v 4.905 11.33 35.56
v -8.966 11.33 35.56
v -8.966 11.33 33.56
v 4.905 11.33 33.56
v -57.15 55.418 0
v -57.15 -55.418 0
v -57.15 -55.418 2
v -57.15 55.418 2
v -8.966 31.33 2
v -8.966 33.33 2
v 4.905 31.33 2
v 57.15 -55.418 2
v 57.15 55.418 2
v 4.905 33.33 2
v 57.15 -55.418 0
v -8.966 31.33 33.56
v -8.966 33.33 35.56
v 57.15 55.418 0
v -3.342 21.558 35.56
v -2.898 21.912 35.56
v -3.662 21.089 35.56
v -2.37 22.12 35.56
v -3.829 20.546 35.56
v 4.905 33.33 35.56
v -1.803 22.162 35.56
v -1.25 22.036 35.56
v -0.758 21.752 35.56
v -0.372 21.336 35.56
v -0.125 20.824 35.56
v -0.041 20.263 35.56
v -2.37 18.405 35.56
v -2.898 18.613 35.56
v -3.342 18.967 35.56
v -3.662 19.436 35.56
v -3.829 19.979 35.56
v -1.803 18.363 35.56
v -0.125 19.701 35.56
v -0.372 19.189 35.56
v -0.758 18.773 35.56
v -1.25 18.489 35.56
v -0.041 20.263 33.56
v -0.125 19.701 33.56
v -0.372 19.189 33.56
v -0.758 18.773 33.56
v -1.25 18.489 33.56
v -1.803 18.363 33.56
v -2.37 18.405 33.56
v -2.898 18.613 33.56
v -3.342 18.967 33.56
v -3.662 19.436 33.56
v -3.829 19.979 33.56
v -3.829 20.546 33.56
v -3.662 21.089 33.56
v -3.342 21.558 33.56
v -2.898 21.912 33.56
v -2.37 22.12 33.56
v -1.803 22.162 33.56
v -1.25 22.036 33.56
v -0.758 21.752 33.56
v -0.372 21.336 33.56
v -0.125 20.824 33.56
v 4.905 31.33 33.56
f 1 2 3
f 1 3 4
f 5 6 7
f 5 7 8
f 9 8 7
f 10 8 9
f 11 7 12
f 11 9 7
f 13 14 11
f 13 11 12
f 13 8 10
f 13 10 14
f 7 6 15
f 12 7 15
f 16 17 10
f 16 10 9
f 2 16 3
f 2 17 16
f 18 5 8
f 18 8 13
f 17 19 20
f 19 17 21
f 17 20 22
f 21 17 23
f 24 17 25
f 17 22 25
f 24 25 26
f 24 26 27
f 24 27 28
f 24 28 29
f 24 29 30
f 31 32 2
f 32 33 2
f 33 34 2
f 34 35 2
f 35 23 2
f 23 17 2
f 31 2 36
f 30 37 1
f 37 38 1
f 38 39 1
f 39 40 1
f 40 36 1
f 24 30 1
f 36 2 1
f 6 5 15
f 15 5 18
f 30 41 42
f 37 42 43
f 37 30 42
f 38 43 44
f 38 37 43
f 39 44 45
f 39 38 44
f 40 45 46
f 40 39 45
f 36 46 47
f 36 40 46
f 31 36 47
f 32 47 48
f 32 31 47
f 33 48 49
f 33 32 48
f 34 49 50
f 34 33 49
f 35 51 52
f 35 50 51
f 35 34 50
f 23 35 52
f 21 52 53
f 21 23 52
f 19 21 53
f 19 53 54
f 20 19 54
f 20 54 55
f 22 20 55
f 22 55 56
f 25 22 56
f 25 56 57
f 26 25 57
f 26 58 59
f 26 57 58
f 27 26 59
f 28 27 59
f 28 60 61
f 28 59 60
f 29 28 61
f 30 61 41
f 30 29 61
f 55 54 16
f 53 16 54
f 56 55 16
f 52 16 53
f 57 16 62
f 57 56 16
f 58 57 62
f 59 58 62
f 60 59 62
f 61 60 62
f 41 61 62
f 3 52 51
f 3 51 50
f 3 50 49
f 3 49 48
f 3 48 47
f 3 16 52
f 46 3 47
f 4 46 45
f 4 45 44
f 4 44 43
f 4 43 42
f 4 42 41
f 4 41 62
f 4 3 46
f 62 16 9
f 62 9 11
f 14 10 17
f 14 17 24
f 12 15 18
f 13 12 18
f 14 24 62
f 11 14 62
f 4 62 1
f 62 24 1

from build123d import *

# Parameters (mm, degrees)
F0_W          = 114.3
F0_H          = 110.8363599028
F2_DEPTH      = 2
F1_E1_W       = 13.8702858239
F1_E1_H       = 35.56
F3_DEPTH      = 2
F5_E4_W       = 13.8702858239
F5_E4_H       = 20
F6_DEPTH      = 2
F7_R          = 1.905
F8_DEPTH      = 6.858
F8_DEPTH_BACK = 2.032


with BuildPart() as f2:
    # F0 (on Top) → F2 (new body)
    with BuildSketch(Plane.XY):
        Rectangle(F0_W, F0_H)
    extrude(amount=F2_DEPTH)

    # F1_E1 (on explicit) → F3 (join)
    with BuildSketch(Plane(origin=(-8.9655527845, 33.3296358585, 0), x_dir=(1, 0, 0), z_dir=(0, -1, 0))):
        with Locations((6.935142912, 17.78)):
            Rectangle(F1_E1_W, F1_E1_H)
    extrude(amount=F3_DEPTH)

    # F5_E4 (on explicit) → F6 (join)
    with BuildSketch(Plane(origin=(-8.9655527845, 31.3296358585, 35.56), x_dir=(1, 0, 0), z_dir=(0, 0, -1))):
        with Locations((6.935142912, 10)):
            Rectangle(F5_E4_W, F5_E4_H)
    extrude(amount=F6_DEPTH)

    # F7 (on face) → F8 (cut, two sides)
    with BuildSketch(Plane(origin=(0, 0, 35.56), x_dir=(1, 0, 0), z_dir=(0, 0, -1))) as f8_sk:
        with Locations((-1.9456632435, -20.2625636011)):
            Circle(F7_R)
    extrude(amount=F8_DEPTH, mode=Mode.SUBTRACT)
    extrude(f8_sk.sketch, amount=-F8_DEPTH_BACK, mode=Mode.SUBTRACT)


solid = f2.part
